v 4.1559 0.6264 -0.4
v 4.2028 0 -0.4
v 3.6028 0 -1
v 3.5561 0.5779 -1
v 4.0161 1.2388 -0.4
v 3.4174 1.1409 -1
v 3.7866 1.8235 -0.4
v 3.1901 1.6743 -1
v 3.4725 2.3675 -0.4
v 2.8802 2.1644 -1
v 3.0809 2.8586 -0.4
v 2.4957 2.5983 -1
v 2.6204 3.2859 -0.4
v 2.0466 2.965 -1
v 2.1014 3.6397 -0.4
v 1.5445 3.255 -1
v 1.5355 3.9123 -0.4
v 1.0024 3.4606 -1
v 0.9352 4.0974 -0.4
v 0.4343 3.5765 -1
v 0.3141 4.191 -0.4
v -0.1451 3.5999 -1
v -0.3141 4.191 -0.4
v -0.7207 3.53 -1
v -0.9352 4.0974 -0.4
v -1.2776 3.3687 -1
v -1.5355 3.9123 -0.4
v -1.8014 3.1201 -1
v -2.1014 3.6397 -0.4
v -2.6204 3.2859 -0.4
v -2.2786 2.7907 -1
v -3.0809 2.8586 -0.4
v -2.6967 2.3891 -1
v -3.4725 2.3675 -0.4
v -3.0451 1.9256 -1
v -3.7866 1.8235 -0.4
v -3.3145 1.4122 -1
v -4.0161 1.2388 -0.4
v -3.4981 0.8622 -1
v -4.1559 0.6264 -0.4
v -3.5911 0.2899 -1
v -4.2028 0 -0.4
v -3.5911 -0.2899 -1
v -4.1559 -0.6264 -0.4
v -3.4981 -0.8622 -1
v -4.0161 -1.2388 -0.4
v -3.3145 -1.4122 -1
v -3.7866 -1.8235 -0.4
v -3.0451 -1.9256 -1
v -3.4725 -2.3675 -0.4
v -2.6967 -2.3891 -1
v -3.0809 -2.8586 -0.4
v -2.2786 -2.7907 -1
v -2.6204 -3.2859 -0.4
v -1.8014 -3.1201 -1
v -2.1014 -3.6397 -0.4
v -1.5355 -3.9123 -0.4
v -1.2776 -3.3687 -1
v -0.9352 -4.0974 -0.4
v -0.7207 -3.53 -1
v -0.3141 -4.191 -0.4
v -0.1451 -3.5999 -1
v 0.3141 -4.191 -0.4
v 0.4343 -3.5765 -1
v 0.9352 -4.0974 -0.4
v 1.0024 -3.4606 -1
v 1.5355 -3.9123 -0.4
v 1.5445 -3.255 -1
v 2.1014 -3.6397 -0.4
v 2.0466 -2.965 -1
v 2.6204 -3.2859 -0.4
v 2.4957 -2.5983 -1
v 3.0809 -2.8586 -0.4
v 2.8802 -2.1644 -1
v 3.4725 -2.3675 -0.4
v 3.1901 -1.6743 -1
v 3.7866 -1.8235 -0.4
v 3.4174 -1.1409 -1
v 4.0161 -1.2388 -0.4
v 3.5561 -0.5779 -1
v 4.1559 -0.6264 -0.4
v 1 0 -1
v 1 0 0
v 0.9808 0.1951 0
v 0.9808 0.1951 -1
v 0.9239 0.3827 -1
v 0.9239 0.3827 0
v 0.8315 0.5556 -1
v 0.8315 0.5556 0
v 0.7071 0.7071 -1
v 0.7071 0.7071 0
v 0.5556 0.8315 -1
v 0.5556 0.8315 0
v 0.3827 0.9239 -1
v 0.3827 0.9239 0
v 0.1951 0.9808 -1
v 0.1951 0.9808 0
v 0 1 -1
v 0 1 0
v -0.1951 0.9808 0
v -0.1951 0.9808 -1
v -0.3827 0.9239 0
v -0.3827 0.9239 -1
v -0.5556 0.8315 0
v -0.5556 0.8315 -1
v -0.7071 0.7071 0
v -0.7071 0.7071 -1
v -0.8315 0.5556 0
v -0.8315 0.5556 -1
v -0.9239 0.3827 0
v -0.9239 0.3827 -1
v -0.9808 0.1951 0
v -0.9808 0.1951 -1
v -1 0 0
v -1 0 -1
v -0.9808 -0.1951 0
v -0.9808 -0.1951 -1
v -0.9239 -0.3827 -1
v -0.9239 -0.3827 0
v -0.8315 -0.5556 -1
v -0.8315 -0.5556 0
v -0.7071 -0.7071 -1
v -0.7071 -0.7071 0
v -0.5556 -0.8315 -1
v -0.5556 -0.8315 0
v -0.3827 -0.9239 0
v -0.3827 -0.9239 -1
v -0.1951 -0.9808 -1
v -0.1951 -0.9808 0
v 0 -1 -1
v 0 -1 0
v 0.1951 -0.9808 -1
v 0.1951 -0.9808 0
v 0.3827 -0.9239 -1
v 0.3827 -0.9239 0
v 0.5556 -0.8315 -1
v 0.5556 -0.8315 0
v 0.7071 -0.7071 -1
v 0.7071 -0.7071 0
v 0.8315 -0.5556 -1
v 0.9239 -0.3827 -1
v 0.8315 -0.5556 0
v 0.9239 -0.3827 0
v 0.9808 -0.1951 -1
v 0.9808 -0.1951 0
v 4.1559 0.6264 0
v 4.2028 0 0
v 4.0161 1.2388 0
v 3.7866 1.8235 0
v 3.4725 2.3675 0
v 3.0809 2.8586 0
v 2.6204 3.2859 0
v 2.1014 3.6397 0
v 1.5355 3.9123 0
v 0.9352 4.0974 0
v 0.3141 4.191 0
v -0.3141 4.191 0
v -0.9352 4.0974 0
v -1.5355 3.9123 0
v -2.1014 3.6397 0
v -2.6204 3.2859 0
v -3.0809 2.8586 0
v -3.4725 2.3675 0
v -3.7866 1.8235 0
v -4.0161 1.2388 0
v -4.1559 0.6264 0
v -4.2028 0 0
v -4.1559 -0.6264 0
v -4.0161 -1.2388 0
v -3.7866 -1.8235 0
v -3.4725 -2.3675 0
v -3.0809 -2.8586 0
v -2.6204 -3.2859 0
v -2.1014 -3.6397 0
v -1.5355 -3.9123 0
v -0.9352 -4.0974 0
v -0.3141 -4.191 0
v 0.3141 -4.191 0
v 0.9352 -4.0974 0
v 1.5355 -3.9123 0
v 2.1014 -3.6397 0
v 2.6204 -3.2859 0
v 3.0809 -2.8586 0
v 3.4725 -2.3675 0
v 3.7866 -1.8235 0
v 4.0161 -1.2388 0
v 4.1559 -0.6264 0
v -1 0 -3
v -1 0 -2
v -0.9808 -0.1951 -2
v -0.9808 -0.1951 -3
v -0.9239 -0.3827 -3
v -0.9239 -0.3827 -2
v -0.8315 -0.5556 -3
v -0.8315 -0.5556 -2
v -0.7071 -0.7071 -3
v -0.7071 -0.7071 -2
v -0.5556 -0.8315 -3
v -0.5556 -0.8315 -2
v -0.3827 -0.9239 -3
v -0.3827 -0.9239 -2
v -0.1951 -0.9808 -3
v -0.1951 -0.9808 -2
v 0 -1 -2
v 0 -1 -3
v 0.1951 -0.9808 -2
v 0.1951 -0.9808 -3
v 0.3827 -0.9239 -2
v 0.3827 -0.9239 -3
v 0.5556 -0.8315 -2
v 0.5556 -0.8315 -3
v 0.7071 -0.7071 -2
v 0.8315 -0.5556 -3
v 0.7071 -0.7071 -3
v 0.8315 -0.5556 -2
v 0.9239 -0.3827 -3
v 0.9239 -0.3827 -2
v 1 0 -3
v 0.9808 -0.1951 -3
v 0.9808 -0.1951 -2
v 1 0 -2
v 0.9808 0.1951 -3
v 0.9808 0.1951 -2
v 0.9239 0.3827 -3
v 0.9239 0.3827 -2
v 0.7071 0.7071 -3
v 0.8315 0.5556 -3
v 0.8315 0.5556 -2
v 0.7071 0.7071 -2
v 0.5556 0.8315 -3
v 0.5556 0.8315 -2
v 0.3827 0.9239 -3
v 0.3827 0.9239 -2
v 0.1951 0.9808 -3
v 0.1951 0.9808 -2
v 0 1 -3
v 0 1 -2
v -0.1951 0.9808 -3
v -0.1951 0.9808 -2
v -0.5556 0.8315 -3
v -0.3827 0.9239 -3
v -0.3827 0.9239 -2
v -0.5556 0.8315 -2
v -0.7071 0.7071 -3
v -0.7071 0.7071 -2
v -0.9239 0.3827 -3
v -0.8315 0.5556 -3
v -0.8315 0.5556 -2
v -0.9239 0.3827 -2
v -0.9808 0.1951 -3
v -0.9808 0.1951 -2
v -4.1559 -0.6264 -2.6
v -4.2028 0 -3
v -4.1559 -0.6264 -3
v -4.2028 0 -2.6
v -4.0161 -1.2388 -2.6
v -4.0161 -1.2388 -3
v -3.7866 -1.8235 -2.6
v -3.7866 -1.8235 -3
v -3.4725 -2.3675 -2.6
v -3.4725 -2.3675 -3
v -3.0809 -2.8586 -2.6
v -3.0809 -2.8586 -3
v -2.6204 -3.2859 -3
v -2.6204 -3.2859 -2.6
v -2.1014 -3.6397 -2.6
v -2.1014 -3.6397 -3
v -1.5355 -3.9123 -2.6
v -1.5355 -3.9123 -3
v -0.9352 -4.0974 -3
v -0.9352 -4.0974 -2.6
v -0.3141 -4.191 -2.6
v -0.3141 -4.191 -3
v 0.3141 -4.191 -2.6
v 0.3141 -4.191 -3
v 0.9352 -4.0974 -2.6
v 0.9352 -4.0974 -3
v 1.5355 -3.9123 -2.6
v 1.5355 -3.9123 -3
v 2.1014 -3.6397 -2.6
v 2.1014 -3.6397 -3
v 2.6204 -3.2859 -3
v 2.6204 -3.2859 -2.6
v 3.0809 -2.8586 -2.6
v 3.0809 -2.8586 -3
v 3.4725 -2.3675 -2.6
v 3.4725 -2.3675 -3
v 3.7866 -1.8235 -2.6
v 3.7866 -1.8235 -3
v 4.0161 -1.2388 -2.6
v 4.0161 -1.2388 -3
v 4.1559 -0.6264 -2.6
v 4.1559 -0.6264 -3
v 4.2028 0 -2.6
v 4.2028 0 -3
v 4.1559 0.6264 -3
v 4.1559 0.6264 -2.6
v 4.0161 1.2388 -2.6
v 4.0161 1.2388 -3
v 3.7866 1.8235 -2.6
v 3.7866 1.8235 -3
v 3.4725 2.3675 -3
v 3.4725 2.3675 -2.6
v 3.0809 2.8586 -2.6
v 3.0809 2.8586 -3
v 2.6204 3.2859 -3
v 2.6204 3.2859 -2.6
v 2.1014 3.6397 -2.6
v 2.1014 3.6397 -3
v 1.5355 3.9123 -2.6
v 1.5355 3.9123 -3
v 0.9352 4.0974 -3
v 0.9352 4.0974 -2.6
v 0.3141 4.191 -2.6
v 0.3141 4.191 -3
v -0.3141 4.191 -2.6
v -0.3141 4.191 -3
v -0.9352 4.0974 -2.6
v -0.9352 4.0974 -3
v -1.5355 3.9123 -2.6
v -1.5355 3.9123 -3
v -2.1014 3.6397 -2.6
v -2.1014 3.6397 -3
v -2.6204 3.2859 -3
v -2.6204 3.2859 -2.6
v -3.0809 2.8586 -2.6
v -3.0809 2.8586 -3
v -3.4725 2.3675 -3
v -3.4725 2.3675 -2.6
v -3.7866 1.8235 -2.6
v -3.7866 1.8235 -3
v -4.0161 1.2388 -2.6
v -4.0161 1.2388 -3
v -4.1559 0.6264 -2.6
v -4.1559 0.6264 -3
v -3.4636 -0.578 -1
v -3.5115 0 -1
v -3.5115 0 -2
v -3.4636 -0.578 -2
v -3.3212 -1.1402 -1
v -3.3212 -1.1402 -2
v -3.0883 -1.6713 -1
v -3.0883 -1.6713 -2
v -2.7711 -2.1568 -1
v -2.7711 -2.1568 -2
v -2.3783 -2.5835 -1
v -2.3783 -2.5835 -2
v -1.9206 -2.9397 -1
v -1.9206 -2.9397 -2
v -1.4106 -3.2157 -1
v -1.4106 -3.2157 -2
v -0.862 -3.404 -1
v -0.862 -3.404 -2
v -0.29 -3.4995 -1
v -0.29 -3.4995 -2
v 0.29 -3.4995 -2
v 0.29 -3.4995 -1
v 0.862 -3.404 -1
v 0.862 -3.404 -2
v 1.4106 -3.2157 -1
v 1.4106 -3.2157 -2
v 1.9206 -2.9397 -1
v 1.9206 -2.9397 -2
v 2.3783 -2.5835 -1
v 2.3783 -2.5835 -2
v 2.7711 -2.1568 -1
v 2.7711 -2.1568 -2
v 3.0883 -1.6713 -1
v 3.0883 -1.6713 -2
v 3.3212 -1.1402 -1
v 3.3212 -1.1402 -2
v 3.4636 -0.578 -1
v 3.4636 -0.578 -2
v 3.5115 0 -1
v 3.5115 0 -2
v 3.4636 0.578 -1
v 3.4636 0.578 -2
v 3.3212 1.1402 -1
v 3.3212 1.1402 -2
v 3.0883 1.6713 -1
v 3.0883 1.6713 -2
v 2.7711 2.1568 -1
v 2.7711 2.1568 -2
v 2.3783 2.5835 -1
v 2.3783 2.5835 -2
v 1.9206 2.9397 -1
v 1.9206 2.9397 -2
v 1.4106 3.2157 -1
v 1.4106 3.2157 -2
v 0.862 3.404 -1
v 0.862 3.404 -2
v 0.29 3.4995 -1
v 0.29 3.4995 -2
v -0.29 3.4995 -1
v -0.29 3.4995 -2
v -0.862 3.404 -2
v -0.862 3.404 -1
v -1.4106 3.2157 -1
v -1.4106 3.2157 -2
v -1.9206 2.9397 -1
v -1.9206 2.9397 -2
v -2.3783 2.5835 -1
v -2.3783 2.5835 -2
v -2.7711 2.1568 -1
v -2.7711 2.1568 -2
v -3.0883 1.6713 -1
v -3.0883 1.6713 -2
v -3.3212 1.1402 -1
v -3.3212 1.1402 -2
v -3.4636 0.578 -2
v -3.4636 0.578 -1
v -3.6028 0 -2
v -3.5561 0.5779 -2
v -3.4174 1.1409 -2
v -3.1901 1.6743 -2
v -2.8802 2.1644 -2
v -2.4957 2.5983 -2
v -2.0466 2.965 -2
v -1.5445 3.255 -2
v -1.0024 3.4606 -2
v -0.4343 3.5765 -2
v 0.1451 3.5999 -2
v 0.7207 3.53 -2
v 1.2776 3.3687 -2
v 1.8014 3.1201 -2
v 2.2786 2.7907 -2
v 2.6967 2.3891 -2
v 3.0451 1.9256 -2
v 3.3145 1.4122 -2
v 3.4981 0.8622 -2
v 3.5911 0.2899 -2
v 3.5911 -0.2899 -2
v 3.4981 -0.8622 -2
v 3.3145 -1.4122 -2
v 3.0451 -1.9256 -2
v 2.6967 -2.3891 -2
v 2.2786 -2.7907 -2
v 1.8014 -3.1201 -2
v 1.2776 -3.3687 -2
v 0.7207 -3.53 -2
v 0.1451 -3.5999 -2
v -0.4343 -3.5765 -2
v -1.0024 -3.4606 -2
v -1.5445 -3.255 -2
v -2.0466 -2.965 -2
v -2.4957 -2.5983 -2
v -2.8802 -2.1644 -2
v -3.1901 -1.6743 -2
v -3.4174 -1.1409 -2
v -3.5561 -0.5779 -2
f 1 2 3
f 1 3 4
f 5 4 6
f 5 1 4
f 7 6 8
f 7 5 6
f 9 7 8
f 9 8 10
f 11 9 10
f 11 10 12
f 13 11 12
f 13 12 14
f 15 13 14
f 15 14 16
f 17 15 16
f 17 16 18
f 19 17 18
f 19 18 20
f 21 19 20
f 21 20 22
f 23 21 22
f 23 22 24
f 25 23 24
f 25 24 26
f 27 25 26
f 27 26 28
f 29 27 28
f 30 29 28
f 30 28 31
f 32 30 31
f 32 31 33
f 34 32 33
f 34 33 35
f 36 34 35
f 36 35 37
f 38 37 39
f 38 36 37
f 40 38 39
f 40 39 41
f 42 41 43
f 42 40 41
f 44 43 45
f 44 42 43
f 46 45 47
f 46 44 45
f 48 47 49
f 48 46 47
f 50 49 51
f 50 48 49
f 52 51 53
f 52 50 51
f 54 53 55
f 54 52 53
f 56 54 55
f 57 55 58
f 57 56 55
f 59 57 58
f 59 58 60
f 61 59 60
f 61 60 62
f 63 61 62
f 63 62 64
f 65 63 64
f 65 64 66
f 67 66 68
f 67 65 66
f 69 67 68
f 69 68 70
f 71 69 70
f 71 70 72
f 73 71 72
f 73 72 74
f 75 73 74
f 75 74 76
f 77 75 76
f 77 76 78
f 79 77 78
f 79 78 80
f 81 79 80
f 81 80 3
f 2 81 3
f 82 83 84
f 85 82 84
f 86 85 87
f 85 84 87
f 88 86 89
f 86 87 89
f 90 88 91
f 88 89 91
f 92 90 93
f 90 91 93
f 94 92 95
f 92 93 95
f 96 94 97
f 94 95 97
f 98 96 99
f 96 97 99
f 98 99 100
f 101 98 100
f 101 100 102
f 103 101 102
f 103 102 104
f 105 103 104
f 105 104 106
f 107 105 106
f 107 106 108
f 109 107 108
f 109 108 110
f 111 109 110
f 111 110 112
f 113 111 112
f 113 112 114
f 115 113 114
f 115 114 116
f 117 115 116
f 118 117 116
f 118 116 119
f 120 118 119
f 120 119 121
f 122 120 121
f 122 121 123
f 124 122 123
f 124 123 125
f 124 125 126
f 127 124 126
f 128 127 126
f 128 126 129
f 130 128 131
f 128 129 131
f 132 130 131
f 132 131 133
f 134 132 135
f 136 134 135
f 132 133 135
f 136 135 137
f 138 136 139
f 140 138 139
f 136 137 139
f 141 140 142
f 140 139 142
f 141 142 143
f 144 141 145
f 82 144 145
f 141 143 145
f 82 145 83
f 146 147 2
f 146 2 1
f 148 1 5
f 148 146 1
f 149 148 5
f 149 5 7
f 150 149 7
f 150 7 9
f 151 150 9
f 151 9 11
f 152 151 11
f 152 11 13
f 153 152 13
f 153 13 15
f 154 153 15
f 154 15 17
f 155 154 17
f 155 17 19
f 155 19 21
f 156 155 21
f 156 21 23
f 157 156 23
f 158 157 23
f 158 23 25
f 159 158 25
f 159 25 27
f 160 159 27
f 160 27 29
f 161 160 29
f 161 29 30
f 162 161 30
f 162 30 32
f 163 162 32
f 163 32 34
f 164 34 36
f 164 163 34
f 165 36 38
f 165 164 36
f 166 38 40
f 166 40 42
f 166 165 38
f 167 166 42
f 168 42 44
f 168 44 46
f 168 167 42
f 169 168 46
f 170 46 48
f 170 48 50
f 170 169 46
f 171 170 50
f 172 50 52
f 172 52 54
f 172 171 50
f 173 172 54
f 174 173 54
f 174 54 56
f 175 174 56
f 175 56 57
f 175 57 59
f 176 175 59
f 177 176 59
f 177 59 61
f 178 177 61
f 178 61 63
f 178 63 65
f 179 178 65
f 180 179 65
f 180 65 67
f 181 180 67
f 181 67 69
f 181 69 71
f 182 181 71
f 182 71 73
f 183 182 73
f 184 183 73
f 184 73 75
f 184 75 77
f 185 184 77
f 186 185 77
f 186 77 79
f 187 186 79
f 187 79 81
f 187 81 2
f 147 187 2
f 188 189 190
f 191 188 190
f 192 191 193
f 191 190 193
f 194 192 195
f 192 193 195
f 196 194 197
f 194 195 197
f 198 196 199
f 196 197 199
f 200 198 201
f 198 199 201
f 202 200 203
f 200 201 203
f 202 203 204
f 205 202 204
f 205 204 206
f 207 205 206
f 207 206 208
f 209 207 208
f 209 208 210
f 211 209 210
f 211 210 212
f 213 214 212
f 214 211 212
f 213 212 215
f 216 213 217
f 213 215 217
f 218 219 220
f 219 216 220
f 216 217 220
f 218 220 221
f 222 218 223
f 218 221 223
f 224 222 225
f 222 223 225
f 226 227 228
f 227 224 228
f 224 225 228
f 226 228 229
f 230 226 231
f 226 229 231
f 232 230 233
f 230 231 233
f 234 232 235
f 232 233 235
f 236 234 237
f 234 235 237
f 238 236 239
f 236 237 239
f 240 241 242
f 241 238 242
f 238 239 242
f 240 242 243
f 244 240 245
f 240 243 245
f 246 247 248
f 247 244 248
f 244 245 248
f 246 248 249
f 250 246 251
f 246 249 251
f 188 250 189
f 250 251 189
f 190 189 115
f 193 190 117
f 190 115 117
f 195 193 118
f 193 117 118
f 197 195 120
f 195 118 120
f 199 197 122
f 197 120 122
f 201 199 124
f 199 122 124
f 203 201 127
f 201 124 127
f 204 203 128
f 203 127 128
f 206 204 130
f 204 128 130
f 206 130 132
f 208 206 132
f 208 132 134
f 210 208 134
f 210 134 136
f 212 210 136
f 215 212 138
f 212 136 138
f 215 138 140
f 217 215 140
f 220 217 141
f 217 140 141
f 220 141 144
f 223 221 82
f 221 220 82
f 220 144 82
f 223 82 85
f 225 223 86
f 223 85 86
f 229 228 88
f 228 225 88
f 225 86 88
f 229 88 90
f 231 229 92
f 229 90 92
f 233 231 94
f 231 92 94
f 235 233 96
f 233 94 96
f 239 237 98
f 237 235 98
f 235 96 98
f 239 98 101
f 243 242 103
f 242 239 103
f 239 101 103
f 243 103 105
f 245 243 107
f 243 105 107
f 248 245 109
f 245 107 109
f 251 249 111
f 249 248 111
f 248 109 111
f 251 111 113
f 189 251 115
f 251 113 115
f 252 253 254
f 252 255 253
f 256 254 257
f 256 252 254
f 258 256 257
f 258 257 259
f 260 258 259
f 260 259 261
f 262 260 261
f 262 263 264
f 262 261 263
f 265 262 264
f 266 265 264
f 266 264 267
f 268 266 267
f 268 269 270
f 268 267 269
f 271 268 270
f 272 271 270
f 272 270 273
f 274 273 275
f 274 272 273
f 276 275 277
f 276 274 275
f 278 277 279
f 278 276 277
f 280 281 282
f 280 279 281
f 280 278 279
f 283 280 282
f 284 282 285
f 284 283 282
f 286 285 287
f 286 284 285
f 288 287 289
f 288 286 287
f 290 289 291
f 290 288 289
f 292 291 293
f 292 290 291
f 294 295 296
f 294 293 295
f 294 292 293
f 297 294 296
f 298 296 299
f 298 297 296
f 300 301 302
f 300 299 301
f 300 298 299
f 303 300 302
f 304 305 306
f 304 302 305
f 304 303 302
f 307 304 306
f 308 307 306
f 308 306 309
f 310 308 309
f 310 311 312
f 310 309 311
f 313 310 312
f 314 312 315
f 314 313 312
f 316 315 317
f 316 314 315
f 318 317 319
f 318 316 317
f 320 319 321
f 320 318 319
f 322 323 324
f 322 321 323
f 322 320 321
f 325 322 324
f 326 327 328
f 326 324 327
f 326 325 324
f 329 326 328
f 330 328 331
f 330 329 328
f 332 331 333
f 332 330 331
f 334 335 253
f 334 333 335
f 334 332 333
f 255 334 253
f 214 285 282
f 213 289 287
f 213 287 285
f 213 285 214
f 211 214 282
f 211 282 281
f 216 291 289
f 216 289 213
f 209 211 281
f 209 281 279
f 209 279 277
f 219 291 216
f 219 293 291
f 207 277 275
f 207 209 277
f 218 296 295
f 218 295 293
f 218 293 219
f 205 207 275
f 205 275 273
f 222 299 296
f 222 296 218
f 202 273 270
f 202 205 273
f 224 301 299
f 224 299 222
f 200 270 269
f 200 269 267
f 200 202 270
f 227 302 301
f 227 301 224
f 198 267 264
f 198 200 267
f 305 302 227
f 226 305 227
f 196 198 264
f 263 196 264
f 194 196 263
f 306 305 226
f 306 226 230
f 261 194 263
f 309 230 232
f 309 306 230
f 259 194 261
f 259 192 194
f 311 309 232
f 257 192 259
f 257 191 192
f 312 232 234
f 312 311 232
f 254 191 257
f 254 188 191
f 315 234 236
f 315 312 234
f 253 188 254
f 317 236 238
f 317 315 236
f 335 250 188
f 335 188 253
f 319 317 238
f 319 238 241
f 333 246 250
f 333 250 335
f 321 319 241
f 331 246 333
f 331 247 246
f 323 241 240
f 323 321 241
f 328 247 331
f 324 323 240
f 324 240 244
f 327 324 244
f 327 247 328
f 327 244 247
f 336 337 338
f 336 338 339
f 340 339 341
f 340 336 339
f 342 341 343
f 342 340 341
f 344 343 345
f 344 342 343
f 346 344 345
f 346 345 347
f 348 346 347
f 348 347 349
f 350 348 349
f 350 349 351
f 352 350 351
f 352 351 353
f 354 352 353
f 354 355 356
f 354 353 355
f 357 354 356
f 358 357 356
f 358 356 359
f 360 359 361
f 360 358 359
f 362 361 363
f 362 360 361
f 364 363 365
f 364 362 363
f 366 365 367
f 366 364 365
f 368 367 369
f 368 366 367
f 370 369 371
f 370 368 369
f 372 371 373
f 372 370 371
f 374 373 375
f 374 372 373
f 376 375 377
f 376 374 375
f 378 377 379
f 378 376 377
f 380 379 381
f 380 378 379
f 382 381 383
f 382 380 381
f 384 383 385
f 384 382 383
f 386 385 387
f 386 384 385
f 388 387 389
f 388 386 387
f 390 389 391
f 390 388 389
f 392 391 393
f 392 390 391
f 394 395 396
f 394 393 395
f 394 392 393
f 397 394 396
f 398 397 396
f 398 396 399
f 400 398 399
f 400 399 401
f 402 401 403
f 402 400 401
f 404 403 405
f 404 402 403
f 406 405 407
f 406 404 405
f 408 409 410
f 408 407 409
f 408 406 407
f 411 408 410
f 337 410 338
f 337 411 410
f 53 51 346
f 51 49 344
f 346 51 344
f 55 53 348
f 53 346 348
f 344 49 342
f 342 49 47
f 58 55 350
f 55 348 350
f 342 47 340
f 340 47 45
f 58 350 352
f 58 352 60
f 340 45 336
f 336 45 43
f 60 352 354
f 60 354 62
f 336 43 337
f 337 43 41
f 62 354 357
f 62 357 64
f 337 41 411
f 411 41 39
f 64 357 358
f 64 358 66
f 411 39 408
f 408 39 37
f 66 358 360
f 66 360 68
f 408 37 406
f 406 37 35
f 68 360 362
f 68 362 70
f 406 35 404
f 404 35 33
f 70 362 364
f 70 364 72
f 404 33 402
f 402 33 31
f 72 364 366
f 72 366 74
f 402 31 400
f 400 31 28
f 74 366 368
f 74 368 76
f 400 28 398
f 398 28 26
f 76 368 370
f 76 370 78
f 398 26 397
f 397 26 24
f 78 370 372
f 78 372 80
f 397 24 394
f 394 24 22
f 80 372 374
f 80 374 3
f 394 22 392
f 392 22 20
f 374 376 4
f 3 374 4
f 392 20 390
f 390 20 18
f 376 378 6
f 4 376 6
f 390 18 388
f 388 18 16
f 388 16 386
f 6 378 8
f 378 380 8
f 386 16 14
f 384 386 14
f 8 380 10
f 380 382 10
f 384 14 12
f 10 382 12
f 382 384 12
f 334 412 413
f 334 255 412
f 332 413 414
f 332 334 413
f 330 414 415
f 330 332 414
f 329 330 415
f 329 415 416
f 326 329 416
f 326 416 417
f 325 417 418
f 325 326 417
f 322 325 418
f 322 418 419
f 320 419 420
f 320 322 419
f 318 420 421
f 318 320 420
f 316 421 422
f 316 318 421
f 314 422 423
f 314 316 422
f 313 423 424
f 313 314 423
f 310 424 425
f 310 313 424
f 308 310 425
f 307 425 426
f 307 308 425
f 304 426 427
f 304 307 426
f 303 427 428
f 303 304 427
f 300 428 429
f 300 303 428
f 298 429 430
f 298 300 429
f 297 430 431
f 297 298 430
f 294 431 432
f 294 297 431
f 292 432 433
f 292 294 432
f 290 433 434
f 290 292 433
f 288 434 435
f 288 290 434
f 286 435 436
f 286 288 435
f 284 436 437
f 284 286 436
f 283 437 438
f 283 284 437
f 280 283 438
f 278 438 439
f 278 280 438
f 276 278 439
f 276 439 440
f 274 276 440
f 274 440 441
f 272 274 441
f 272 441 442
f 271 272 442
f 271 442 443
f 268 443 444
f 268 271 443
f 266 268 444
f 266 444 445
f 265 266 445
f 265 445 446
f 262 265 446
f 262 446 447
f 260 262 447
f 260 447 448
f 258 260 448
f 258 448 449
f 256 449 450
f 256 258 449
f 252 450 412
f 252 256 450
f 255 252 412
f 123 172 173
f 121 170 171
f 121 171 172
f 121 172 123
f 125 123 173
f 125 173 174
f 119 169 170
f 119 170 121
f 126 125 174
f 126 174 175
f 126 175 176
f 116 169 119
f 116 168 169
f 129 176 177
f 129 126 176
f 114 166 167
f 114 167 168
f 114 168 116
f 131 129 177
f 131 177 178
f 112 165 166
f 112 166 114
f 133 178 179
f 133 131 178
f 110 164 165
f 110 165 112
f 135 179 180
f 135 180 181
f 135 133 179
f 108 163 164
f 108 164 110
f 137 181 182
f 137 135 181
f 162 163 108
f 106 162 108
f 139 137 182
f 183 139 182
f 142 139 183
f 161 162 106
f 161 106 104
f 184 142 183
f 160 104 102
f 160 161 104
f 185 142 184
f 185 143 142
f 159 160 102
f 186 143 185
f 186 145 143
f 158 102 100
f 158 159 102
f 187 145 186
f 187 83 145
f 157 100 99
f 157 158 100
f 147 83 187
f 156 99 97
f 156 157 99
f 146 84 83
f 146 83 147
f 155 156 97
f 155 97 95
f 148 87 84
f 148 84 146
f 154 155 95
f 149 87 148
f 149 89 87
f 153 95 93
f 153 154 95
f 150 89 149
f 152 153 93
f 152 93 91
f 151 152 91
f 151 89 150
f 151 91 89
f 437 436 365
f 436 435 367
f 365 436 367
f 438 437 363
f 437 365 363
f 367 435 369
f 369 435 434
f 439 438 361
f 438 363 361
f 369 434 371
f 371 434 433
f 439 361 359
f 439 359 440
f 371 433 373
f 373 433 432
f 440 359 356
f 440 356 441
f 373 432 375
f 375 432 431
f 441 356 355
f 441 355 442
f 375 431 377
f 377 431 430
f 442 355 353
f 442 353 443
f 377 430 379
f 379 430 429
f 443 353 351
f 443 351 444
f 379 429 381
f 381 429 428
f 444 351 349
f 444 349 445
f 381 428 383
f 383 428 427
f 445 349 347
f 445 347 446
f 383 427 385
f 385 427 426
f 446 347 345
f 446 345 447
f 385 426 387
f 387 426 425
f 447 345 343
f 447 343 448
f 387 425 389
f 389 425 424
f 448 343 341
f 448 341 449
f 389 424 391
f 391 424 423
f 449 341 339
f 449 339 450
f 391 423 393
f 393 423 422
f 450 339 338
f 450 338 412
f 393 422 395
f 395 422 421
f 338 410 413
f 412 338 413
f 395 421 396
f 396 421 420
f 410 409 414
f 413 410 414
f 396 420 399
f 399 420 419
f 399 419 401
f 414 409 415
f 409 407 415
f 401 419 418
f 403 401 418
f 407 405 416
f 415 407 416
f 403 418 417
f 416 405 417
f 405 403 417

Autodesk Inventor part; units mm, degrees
ref_plane "YZ Plane" through (0, 0, 0) normal (1, 0, 0) x (0, 1, 0)
ref_plane "XZ Plane" through (0, 0, 0) normal (0, 1, 0) x (-1, 0, 0)
sketch "Sketch1" plane through (0, 0, 0) normal (0, 0, 1) x (1, 0, 0)
  line L0 (7.011, 4.2884) -> (7.2242, 4.5036)
  line L1 (9.7459, 1.5804) -> (9.5018, 1.4012)
  line L2 (10.4101, 2.9001) -> (10.3642, 2.6007)
  line L3 (6.7053, 2.2945) -> (6.6103, 2.5821)
  line L4 (9.2149, 4.8291) -> (9.4855, 4.6929)
  circle A0 centre (8.485, 3.042) radius 1
  circle A1 centre (8.485, 3.042) radius 1.9244
  circle A2 centre (0, 0) radius 4.2028
  circle A3 centre (0, 0) radius 1
extrude "Extrusion1" add sketch "Sketch1" against normal blind 1 contours A2
sketch "Sketch2" plane through (0, 0, -1) normal (0, 0, -1) x (-1, 0, 0)
  circle A0 centre (0, 0) radius 4.2028 projected
  circle A1 centre (0, 0) radius 1 projected
  line L0 (-6.5615, 2.8811) -> (-6.56, 3.184) projected
  line L1 (-9.4855, 4.6929) -> (-9.7314, 4.516) projected
  line L2 (-8.945, 1.1673) -> (-8.646, 1.1184) projected
  circle A2 centre (-8.485, 3.042) radius 1 projected
  circle A3 centre (-8.485, 3.042) radius 1.9485
  circle A4 centre (0, 0) radius 3.5115
extrude "Extrusion2" add sketch "Sketch2" along normal blind 1 contours A4
sketch "Sketch3" plane through (0, 0, -2) normal (0, 0, -1) x (-1, 0, 0)
  circle A0 centre (0, 0) radius 4.2028 projected
  circle A1 centre (0, 0) radius 1 projected
  circle A2 centre (0, 0) radius 1 projected
ref_plane "Work Plane1" through (5.485, 0.042, -3) normal (0, 0, -1) x (0, 1, 0)
extrude "Extrusion3" add sketch "Sketch3" along normal up to surface (1 mm away)
chamfer "Chamfer1" distance 0.6 angle 45 2 edges at (4.2028, 0, -2) (-4.2028, 0, -1)
properties part number "koło_pasowe_duze"
